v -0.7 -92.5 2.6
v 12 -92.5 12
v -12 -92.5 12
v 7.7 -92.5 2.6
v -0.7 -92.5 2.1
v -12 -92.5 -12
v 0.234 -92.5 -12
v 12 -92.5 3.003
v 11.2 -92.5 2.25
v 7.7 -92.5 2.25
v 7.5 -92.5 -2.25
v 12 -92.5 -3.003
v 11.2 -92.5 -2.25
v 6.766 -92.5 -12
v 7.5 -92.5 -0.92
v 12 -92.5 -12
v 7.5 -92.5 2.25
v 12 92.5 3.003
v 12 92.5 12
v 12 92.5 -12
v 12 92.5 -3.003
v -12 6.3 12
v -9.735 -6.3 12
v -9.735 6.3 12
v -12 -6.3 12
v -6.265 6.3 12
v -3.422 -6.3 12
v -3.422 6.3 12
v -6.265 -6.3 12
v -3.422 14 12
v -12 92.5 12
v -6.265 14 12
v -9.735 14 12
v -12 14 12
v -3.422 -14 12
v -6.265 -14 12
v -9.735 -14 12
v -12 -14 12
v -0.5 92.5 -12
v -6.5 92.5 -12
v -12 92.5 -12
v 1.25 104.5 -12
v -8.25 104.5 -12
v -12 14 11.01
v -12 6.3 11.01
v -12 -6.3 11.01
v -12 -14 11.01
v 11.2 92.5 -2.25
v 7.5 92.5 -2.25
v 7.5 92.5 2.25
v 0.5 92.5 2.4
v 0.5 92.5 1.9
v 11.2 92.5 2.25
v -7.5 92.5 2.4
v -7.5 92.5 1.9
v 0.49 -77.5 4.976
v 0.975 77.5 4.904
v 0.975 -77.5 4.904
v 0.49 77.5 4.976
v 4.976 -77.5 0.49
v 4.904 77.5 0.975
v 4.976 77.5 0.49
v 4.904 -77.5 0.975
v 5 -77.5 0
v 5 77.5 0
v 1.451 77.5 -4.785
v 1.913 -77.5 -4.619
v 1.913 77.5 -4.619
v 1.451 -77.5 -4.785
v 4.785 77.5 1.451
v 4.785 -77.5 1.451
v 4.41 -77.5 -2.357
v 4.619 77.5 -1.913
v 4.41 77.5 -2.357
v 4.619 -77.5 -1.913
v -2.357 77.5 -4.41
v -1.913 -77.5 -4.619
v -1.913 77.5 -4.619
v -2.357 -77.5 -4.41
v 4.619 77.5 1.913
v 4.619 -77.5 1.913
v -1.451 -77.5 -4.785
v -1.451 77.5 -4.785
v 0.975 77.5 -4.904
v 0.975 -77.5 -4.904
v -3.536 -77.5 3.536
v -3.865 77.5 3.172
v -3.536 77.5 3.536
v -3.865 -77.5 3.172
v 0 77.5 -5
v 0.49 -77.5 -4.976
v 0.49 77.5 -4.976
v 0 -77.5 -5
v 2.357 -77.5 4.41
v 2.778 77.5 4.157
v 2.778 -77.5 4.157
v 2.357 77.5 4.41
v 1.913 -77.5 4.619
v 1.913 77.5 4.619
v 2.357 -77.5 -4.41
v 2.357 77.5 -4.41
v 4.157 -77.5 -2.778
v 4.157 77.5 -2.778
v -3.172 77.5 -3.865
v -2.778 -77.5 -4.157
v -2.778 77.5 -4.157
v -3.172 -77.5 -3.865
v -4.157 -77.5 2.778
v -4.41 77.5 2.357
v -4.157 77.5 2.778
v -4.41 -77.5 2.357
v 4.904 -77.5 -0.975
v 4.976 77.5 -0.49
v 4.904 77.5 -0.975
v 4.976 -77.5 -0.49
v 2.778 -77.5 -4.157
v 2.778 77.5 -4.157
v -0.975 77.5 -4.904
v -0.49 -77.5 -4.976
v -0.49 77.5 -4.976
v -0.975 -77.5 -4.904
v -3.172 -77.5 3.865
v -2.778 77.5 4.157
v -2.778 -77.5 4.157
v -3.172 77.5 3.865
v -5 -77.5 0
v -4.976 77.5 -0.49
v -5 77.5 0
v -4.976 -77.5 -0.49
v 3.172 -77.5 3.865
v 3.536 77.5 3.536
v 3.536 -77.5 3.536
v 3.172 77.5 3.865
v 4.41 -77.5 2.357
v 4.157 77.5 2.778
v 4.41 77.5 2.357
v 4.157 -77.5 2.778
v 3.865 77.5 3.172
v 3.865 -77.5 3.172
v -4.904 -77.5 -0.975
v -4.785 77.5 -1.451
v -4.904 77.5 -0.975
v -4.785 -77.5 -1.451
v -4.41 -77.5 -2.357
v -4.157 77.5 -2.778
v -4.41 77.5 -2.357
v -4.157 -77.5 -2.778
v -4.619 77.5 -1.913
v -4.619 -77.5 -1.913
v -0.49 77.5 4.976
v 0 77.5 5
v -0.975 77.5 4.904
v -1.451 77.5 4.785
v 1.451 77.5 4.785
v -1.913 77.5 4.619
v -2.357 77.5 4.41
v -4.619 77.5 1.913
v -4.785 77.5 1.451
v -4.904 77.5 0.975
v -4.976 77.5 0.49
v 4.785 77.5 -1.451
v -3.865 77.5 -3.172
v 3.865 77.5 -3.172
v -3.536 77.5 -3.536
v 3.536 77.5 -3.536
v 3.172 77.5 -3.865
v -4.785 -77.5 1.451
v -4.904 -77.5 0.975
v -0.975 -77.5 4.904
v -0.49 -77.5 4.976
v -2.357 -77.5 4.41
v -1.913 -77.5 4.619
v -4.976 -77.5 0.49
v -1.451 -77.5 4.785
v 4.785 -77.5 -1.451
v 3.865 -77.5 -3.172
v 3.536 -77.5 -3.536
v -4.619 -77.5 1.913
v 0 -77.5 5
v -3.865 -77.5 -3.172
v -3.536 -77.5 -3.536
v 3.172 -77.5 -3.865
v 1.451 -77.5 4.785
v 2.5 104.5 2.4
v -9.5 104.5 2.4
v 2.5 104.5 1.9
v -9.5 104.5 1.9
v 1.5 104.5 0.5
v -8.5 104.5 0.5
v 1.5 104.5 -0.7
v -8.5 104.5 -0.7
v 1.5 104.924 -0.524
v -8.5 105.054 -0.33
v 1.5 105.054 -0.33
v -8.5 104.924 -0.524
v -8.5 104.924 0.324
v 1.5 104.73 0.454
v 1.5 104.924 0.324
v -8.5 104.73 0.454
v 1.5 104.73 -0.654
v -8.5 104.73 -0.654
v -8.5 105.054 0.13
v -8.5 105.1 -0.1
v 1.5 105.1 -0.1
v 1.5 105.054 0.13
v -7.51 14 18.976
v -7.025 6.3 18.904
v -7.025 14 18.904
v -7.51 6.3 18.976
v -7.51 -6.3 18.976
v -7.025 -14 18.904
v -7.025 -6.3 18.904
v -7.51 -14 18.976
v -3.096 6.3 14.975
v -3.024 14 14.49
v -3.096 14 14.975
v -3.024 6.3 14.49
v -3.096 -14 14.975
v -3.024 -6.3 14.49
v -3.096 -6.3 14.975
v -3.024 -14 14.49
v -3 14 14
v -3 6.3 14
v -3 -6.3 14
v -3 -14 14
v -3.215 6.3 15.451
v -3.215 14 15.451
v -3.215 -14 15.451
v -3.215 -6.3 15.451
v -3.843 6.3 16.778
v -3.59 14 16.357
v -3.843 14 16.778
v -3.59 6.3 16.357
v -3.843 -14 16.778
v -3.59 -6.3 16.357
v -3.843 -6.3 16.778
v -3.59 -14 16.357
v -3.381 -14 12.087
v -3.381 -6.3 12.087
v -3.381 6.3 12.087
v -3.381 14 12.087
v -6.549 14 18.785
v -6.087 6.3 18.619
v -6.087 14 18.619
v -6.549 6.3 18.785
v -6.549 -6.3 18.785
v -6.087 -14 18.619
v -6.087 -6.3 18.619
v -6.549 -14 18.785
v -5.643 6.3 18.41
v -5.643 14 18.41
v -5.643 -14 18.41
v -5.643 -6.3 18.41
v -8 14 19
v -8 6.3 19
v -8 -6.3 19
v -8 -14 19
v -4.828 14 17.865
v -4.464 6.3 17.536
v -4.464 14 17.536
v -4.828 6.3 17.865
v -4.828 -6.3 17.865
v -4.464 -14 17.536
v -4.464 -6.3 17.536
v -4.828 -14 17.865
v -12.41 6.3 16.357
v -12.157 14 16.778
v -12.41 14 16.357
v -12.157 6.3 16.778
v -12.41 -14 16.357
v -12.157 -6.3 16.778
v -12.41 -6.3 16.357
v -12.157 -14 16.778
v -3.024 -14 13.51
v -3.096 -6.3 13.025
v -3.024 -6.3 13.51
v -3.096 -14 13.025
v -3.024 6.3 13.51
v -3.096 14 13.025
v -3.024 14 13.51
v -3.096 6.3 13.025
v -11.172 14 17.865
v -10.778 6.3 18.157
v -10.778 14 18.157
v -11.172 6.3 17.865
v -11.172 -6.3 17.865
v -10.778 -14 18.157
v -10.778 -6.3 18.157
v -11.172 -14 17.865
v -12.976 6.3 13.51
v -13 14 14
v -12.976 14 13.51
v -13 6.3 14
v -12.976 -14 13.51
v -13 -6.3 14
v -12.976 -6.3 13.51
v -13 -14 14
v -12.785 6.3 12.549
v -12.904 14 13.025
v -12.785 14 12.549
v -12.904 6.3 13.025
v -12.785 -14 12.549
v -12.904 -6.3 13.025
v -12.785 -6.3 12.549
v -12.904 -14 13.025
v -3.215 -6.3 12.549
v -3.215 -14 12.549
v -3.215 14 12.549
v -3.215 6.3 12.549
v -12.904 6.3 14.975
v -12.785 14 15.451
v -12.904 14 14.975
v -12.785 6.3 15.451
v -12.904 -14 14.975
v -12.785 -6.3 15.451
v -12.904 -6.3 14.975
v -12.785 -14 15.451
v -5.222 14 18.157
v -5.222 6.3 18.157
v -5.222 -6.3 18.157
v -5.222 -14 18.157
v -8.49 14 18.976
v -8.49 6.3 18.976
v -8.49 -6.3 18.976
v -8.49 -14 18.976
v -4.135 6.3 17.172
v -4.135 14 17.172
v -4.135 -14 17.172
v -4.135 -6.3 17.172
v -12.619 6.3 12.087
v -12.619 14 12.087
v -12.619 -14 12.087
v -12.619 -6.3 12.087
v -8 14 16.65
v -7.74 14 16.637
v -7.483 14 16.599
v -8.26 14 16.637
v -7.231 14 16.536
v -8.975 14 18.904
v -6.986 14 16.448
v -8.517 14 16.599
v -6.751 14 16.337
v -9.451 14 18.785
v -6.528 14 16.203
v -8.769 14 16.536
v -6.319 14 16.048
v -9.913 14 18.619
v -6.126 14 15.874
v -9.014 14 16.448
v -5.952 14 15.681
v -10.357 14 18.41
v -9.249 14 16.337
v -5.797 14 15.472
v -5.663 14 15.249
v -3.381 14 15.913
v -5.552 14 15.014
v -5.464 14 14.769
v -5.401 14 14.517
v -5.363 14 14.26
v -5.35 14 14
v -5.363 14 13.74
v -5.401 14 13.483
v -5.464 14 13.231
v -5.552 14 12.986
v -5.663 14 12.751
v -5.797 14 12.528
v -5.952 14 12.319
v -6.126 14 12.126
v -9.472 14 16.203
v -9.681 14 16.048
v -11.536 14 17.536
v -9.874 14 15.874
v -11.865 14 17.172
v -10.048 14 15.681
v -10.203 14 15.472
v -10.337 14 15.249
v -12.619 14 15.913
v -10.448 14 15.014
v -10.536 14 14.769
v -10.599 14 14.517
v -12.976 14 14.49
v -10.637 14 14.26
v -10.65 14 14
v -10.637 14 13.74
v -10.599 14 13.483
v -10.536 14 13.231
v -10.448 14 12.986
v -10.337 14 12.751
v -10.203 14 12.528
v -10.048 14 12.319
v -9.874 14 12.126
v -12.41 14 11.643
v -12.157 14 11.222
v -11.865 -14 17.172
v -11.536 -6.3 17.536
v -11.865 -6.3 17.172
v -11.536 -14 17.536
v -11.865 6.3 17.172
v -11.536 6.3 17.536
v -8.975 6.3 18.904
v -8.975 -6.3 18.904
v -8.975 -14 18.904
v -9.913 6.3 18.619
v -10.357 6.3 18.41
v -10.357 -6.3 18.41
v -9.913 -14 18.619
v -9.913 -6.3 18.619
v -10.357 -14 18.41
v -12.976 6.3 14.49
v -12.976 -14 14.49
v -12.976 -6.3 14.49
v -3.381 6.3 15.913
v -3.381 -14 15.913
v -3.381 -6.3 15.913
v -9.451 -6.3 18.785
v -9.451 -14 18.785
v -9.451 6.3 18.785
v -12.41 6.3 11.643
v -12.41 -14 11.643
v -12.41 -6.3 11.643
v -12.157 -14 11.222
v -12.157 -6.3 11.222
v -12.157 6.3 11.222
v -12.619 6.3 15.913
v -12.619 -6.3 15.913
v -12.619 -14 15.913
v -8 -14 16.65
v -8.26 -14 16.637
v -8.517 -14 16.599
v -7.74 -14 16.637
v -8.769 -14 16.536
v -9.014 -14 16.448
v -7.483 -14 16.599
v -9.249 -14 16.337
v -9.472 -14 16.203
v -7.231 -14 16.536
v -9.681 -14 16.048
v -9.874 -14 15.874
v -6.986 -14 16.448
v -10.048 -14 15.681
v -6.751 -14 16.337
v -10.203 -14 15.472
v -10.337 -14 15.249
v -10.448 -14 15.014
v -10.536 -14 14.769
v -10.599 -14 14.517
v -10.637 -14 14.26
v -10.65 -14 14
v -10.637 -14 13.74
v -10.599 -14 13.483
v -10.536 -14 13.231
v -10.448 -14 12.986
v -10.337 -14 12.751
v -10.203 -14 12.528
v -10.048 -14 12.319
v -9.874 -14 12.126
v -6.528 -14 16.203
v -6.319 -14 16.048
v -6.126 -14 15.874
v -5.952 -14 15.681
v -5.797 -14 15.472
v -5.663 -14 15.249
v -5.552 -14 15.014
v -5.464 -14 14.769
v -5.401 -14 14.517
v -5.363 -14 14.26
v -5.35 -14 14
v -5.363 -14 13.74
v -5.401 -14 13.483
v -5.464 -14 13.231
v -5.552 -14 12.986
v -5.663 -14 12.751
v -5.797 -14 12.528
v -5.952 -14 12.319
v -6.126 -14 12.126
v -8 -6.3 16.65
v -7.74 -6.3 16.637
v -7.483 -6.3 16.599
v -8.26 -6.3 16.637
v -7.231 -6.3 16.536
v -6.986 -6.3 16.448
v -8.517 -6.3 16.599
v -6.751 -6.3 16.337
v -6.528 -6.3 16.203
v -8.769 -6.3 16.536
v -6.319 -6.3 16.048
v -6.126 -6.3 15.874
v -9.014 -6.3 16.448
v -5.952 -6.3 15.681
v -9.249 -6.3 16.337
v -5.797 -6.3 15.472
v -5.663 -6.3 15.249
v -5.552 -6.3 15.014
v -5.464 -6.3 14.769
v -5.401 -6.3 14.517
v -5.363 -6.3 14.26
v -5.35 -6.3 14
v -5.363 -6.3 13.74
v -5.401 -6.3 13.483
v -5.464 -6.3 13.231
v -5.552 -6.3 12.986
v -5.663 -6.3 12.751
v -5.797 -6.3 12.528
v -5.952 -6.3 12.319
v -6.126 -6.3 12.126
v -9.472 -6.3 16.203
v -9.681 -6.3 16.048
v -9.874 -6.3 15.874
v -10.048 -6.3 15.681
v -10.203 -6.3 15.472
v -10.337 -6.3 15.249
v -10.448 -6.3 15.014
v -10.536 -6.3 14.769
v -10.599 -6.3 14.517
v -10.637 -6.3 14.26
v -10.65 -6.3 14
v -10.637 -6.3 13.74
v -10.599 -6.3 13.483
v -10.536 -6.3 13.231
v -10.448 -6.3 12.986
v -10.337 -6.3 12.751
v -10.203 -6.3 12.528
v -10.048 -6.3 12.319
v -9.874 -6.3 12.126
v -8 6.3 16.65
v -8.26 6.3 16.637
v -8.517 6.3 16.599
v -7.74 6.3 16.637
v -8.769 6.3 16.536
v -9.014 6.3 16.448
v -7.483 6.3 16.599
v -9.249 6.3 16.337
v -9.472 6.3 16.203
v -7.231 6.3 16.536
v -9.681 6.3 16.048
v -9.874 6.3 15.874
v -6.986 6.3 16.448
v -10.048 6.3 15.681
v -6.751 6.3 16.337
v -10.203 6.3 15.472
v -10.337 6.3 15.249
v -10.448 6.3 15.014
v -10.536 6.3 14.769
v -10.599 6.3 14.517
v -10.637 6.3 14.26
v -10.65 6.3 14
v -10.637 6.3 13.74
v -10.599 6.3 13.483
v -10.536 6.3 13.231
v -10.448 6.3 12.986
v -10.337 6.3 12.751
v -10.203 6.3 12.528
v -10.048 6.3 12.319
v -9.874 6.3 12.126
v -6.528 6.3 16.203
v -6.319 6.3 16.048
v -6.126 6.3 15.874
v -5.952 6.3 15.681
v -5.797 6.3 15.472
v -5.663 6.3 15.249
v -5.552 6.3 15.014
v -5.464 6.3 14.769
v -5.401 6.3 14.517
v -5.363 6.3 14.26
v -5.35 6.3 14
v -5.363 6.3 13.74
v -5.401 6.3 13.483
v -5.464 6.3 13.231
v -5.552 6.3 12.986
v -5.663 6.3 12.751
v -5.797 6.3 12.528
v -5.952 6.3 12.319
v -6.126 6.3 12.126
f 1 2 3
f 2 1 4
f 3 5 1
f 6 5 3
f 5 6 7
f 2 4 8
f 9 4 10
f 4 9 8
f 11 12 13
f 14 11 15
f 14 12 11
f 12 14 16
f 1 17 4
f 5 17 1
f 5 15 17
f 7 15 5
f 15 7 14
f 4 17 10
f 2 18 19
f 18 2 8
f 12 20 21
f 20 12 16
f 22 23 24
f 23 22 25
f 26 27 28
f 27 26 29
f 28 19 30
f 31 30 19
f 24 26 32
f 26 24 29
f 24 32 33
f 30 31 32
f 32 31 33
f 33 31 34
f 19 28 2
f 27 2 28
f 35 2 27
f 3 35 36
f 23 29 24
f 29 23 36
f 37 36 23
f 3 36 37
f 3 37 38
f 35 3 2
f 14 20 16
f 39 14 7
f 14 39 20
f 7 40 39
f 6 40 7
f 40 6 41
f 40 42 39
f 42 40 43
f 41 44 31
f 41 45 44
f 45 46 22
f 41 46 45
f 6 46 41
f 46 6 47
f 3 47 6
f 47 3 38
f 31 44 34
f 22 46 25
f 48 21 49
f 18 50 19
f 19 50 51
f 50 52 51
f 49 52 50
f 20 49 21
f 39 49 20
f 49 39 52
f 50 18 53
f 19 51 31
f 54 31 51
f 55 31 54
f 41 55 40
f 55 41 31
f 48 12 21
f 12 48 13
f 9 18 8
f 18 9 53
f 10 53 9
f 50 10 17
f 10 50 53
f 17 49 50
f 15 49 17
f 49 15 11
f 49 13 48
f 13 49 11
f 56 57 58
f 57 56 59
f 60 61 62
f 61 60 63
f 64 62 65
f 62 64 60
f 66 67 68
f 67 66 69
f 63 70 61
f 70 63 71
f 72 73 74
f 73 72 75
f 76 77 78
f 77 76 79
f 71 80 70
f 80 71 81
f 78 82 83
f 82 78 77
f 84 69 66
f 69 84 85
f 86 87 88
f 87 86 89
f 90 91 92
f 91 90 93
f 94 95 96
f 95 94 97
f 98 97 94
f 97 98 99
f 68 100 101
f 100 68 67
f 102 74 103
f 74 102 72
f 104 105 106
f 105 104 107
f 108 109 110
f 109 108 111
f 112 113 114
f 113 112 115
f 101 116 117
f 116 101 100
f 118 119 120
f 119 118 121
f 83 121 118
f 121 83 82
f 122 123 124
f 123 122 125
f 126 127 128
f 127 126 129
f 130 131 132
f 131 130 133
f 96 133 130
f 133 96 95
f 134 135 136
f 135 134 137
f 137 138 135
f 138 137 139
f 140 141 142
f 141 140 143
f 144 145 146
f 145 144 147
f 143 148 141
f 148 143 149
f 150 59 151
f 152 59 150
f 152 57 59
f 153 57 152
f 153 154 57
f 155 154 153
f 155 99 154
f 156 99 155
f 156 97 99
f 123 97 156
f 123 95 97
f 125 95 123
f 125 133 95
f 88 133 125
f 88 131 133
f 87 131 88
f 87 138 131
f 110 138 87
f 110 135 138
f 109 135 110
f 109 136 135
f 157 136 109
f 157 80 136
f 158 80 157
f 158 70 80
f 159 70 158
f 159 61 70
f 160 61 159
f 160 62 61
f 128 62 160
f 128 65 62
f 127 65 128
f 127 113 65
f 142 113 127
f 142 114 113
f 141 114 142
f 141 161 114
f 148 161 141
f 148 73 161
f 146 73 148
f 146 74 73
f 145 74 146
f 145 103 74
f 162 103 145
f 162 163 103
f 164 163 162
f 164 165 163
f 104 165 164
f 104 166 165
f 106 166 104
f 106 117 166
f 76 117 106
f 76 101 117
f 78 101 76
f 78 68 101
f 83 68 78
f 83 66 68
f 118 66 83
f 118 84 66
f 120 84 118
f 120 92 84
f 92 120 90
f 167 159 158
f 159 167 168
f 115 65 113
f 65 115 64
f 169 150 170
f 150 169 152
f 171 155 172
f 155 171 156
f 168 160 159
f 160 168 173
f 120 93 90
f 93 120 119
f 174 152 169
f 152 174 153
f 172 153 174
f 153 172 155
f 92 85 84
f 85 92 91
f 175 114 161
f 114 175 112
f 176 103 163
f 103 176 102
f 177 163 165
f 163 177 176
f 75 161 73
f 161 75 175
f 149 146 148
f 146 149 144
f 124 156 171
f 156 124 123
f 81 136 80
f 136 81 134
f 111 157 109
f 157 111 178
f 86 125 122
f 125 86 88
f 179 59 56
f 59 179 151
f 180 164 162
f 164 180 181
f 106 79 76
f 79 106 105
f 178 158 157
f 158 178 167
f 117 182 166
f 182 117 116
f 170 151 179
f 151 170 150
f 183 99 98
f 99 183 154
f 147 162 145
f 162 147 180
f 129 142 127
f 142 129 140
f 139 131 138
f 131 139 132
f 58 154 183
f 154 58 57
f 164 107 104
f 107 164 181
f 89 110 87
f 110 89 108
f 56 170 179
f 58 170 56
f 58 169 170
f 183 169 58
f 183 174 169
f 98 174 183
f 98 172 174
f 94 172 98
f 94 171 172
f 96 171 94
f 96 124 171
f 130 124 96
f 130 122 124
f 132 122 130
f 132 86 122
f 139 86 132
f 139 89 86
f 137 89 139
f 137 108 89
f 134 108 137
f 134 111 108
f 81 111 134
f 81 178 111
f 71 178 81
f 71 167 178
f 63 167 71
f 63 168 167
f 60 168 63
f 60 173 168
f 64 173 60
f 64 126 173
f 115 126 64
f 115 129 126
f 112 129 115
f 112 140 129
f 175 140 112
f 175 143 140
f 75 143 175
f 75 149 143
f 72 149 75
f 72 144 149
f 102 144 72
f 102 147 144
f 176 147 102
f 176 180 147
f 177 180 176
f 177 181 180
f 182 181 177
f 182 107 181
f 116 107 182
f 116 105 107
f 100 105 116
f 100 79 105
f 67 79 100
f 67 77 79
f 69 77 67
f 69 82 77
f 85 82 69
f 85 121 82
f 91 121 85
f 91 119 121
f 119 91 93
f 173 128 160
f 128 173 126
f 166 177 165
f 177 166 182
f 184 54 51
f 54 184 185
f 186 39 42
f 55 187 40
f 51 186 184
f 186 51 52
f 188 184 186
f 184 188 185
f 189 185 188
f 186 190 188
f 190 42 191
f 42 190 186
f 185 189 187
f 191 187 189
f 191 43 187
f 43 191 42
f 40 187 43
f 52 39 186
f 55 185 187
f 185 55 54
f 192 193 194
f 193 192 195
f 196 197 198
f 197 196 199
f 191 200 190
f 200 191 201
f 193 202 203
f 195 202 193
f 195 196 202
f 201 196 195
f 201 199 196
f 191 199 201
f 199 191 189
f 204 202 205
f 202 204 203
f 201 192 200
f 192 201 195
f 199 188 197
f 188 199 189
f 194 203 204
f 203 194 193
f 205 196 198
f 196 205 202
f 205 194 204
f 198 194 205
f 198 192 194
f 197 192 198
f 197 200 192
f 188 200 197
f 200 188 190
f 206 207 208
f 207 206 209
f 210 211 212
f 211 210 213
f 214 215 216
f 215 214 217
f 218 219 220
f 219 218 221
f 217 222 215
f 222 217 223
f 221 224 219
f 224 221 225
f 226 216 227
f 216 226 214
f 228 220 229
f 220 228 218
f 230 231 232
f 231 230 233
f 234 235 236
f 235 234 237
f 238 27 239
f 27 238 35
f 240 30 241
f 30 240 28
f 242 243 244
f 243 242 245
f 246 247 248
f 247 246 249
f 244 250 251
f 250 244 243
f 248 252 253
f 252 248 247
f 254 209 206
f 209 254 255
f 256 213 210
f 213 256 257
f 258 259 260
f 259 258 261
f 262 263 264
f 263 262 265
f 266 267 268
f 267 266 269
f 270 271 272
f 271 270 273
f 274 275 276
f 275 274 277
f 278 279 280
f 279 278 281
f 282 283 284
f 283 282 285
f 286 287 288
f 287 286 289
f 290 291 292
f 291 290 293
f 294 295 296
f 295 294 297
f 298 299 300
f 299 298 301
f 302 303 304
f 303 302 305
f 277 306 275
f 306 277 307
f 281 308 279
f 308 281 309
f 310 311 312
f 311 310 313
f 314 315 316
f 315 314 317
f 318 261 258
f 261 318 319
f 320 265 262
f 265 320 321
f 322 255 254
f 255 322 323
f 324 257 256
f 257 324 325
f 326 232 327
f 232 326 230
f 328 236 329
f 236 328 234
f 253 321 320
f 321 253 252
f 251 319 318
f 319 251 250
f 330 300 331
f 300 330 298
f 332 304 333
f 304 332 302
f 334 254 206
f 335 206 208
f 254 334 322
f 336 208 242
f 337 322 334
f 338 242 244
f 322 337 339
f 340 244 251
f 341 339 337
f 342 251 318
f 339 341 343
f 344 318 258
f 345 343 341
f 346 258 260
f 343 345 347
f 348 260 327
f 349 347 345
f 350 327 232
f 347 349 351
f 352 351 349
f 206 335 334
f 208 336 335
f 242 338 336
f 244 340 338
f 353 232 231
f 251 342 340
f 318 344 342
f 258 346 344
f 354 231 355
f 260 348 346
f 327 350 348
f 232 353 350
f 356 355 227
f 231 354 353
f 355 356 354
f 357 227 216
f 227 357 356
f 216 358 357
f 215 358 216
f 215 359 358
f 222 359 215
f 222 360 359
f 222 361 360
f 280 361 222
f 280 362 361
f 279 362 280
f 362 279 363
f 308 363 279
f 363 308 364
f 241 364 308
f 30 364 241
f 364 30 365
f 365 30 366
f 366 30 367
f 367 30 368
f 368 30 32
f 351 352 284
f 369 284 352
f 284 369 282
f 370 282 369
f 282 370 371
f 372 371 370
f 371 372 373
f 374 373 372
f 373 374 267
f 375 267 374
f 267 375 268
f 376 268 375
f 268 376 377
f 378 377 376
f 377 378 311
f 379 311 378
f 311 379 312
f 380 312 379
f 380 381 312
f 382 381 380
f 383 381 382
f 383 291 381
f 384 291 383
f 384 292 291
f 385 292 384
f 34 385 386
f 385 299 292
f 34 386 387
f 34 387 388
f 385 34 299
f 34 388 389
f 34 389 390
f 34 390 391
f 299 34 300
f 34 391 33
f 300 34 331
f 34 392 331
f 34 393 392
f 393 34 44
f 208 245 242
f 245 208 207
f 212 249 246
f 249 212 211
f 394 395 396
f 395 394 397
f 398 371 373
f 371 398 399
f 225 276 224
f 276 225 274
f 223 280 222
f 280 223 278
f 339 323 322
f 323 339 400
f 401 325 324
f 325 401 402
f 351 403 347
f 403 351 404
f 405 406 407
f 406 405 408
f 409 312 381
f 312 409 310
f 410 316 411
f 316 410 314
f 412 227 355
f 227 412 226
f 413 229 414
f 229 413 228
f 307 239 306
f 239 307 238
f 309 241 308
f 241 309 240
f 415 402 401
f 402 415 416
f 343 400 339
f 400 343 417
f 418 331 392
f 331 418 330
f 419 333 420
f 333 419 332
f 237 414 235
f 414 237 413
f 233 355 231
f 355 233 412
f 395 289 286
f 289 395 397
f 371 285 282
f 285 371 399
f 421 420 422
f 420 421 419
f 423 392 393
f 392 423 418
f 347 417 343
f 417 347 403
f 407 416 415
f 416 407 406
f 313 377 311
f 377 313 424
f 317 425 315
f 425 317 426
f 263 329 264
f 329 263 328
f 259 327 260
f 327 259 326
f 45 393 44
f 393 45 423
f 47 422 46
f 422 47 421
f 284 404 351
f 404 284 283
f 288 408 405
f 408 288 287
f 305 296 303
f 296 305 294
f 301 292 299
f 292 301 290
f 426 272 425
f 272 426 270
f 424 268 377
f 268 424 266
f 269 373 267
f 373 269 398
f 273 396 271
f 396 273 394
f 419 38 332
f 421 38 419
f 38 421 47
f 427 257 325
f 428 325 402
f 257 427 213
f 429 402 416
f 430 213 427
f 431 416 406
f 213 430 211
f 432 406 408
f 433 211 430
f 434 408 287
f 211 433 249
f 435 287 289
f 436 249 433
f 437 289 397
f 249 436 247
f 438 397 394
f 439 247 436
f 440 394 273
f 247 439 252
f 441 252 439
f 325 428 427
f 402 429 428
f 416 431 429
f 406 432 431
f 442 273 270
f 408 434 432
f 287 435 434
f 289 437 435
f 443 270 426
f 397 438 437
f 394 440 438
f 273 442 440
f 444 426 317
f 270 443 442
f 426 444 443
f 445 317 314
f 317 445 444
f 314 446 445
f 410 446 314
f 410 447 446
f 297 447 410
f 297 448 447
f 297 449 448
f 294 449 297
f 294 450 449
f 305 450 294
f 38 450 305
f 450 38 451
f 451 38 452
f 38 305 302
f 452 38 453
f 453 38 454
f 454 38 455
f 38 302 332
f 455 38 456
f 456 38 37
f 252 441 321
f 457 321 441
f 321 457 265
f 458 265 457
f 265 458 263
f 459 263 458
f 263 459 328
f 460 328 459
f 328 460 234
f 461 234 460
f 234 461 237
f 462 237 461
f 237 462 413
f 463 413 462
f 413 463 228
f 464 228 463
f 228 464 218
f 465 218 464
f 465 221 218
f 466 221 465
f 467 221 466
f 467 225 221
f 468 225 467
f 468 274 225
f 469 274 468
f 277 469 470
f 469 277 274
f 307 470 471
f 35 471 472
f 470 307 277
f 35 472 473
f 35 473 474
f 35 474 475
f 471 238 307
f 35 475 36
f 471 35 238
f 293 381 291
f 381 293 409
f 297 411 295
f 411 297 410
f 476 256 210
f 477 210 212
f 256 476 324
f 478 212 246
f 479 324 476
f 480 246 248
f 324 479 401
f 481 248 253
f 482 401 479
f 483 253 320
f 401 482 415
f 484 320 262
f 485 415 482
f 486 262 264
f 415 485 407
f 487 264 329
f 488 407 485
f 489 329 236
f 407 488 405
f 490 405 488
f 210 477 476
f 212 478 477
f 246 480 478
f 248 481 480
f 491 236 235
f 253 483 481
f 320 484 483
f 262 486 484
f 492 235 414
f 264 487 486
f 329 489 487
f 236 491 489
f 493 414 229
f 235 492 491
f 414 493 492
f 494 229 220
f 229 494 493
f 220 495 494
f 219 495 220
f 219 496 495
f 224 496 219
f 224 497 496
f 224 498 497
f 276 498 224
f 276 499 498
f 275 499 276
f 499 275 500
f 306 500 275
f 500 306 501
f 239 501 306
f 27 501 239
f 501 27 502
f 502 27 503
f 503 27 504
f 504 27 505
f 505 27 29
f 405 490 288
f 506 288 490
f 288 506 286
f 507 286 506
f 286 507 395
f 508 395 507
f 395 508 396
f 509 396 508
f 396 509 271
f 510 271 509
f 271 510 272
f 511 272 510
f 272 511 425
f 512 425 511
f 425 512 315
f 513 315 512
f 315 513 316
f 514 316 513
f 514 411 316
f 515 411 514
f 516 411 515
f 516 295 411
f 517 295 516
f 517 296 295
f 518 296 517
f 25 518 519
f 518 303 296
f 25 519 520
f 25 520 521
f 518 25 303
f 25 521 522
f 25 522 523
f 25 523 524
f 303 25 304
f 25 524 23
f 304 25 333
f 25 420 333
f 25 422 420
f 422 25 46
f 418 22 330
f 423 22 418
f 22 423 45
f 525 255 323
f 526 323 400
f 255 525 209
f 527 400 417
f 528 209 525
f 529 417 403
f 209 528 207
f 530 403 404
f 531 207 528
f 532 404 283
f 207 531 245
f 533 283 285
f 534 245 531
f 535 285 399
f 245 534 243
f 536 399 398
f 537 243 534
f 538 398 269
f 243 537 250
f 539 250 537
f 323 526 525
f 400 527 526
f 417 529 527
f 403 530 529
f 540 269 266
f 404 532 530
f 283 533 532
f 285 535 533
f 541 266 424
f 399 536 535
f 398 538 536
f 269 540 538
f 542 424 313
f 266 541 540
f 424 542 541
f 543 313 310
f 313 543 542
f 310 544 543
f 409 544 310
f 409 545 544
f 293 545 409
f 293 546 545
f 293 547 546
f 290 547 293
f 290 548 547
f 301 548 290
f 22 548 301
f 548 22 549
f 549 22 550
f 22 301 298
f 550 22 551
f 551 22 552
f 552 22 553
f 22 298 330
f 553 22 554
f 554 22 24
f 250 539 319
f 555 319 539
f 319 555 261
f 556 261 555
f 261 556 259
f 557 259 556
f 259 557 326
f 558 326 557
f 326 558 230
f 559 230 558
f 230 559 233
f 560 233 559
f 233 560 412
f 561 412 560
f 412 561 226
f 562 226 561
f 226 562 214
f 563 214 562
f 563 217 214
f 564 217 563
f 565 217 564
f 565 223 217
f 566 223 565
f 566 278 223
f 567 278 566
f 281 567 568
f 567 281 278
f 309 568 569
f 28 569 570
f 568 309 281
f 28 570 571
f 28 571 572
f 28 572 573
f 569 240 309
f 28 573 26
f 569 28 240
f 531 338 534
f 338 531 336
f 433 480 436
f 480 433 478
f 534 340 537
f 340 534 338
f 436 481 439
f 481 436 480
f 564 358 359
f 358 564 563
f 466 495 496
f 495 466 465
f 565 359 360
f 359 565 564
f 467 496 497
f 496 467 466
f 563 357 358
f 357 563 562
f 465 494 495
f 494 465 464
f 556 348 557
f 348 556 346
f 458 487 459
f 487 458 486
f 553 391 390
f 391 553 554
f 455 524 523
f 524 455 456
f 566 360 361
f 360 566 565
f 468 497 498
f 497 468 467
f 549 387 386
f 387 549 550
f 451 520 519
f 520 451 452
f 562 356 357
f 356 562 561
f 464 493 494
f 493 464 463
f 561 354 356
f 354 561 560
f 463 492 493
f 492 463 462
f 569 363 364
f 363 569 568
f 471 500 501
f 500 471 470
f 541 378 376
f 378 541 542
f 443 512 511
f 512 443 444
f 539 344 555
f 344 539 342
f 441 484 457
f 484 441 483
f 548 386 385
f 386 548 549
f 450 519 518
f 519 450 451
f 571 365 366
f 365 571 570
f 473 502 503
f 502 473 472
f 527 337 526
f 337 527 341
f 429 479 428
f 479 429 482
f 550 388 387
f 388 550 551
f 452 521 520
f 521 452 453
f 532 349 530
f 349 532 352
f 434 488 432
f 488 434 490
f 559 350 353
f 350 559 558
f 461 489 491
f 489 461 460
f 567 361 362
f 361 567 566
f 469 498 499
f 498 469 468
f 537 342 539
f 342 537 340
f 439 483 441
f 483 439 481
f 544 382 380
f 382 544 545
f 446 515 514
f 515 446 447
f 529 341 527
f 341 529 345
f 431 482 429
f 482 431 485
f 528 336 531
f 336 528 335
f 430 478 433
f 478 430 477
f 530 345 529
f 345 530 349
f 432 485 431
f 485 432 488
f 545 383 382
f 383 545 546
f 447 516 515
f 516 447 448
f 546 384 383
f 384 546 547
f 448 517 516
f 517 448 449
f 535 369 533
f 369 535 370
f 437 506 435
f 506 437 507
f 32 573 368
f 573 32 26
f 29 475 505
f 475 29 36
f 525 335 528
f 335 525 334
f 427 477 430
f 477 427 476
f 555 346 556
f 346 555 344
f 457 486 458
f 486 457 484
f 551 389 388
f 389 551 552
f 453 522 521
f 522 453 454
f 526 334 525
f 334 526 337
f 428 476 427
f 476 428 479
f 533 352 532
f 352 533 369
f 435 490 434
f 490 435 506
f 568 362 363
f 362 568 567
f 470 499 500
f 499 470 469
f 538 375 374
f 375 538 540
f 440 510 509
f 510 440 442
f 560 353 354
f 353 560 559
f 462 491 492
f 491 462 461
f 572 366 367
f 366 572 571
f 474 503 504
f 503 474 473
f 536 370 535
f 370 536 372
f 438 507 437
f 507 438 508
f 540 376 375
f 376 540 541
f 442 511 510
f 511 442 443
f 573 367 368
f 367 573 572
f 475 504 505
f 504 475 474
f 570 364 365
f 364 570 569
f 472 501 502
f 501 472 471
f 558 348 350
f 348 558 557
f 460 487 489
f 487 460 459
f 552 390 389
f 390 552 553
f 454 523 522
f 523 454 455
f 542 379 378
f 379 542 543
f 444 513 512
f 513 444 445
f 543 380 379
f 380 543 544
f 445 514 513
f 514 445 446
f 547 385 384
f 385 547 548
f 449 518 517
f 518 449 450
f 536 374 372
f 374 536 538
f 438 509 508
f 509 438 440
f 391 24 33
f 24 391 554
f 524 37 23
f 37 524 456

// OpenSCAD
// file: edge_standard.scad
// ====================================================================
// 2. Standard Frame Edge Strut (Part 2 of 8)
// Standardized 185 mm structural beam
// Features 2 spline slots on outside edges (+X and +Z faces)
// Features Male wedge on +Y end, Female open-top pocket on -Y end
// ====================================================================
include <../config.scad>
use <../modules/dovetail.scad>
use <../modules/spline_profile.scad>

module edge_standard(
    length = FRAME_EDGE_LEN,
    width  = BEAM_WIDTH,
    height = BEAM_HEIGHT,
    has_spline = true,
    has_spline_x = undef,
    has_spline_z = undef
) {
    spline_x = is_undef(has_spline_x) ? has_spline : has_spline_x;
    spline_z = is_undef(has_spline_z) ? has_spline : has_spline_z;

    difference() {
        // Main solid beam body
        cube([width, length, height], center = true);
        
        // Spline slot 1 on outside edge (+X face)
        if (spline_x) {
            translate([width/2, 0, 0])
            rotate([0, 90, 0])
            spline_groove_negative(length = length + 2, axis = "Y");
        }
        
        // Spline slot 2 on outside edge (+Z face)
        if (spline_z) {
            translate([0, 0, height/2])
            spline_groove_negative(length = length + 2, axis = "Y");
        }
        
        // Female open-top wedge pocket at -Y end
        translate([0, -length/2, 0])
        rotate([0, 0, 180])
        female_dovetail_pocket(w = width, h = height);
        
        // Internal weight reduction channel
        rotate([90, 0, 0])
        cylinder(d = 10, h = length - (DOVETAIL_DEPTH * 2 + 6), center = true);
    }
    
    // Male wedge tenon at +Y end
    translate([0, length/2, 0])
    male_dovetail(w = width, h = height);
}

// Standalone preview
edge_standard();
// file: ../modules/hinge.scad
// ====================================================================
// Integrated 3D Printable Hinge Module
// Pin-and-barrel knuckle hinge for French doors and top roof doors
// ====================================================================
include <../config.scad>

// Female Hinge Knuckle (mounted to frame pillar)
module hinge_female_knuckle(
    barrel_od = 10.0,
    pin_id = 5.0,
    height = 28.0,
    center_gap = 12.0
) {
    difference() {
        cylinder(d = barrel_od, h = height, center = true);
        
        // Center cutout for male knuckle
        cube([barrel_od + 2, barrel_od + 2, center_gap + 2*TOL_HINGE], center = true);
        
        // Through-hole for hinge pin
        cylinder(d = pin_id + TOL_HINGE, h = height + 4, center = true);
    }
}

// Male Hinge Knuckle (mounted to door frame)
module hinge_male_knuckle(
    barrel_od = 10.0,
    pin_id = 5.0,
    knuckle_h = 11.5
) {
    difference() {
        cylinder(d = barrel_od - 0.2, h = knuckle_h, center = true);
        
        // Through-hole for hinge pin
        cylinder(d = pin_id + TOL_HINGE, h = knuckle_h + 2, center = true);
    }
}

// Dedicated 3D Printable Hinge Pin with Retention Head
module hinge_pin(
    pin_id = 5.0,
    length = 32.0
) {
    union() {
        // Main pin shaft
        cylinder(d = pin_id - TOL_HINGE, h = length, center = true);
        
        // Chamfered tip for easy alignment insertion
        translate([0, 0, length/2])
        cylinder(r1 = (pin_id - TOL_HINGE)/2, r2 = (pin_id - TOL_HINGE)/2 - 0.8, h = 2, center = false);
        
        // Retention cap
        translate([0, 0, -length/2 - 2])
        cylinder(d = pin_id + 4, h = 2.5, center = false);
    }
}
// file: ../modules/spline_profile.scad
// ====================================================================
// Cellophane Spline Groove & Snap-in Locking Strip Module
// Retention mechanism to hold packaging plastic taut without screws
// ====================================================================
include <../config.scad>

// Negative volume for cutting the spline groove into any beam surface
// Cuts into the -Z direction from Z=0.
// Axis parameter: "Y" (default, aligned with beam length) or "X"
module spline_groove_negative(length = 100, axis = "Y") {
    gw = GROOVE_WIDTH;   // 4.5 mm
    gd = GROOVE_DEPTH;   // 5.0 mm
    
    // Cross-section profile of the groove (in X-Z plane, cuts down into -Z)
    // with 45-degree lead-in chamfer at the mouth to prevent tearing cellophane
    module groove_cross_section_2d() {
        polygon(points = [
            [-(gw/2 + 0.8),  0.05],  // Mouth chamfer outer left
            [-gw/2,         -0.80],  // Mouth chamfer inner left
            [-gw/2,         -gd],    // Bottom left
            [ gw/2,         -gd],    // Bottom right
            [ gw/2,         -0.80],  // Mouth chamfer inner right
            [ (gw/2 + 0.8),  0.05]   // Mouth chamfer outer right
        ]);
    }
    
    if (axis == "Y") {
        rotate([90, 0, 0])
        linear_extrude(height = length, center = true) {
            groove_cross_section_2d();
        }
    } else {
        rotate([0, 90, 0])
        rotate([0, 0, 90])
        linear_extrude(height = length, center = true) {
            groove_cross_section_2d();
        }
    }
}

// 2D Profile of the snap-in locking spline clip (X-Z plane)
// Designed for FDM printing with smooth entry, retention ridge, and thumb cap
module spline_clip_profile_2d() {
    w_cap   = 6.8; // Top thumb-press cap width (depth stop & grip)
    h_cap   = 1.8; // Cap thickness
    w_shaft = 3.9; // Shaft body width (sized for 4.5mm groove + cellophane)
    h_depth = 4.6; // Insertion depth into groove
    w_nose  = 2.8; // Tapered lead-in nose width
    w_ridge = 4.3; // Retention snap ridge width
    
    union() {
        // 1. Top Thumb-Press Cap / Flange (sits above groove as depth stop)
        translate([0, h_cap / 2])
        hull() {
            translate([-w_cap/2 + 0.8, -h_cap/2 + 0.4]) circle(r = 0.4, $fn=16);
            translate([ w_cap/2 - 0.8, -h_cap/2 + 0.4]) circle(r = 0.4, $fn=16);
            translate([-w_cap/2 + 1.2,  h_cap/2 - 0.4]) circle(r = 0.4, $fn=16);
            translate([ w_cap/2 - 1.2,  h_cap/2 - 0.4]) circle(r = 0.4, $fn=16);
        }
        
        // 2. Insertion Shaft with Retention Ridge & Chamfered Nose
        translate([0, 0])
        polygon(points = [
            [-w_shaft/2,        0.0],
            [-w_shaft/2,       -2.2],
            [-w_ridge/2,       -3.0], // Snap retention bead
            [-w_shaft/2,       -3.6],
            [-w_nose/2,        -h_depth], // Nose chamfer
            [ w_nose/2,        -h_depth],
            [ w_shaft/2,       -3.6],
            [ w_ridge/2,       -3.0], // Snap retention bead
            [ w_shaft/2,       -2.2],
            [ w_shaft/2,        0.0]
        ]);
    }
}

// 3D Snap-in Locking Spline Clip (oriented along Y axis by default)
// When placed at Z = 0 with oriented_for_print = true, lays flat on the bed
module spline_clip(length = 150, axis = "Y", oriented_for_print = false) {
    if (oriented_for_print) {
        // Lay flat on side for maximum layer strength and zero supports
        // Cap width (6.8mm) or shaft lays on build plate
        rotate([0, 90, 0])
        rotate([0, 0, 90])
        linear_extrude(height = length, center = true) {
            spline_clip_profile_2d();
        }
    } else {
        if (axis == "Y") {
            rotate([90, 0, 0])
            linear_extrude(height = length, center = true) {
                spline_clip_profile_2d();
            }
        } else {
            rotate([0, 90, 0])
            rotate([0, 0, 90])
            linear_extrude(height = length, center = true) {
                spline_clip_profile_2d();
            }
        }
    }
}
// file: ../modules/dovetail.scad
// ====================================================================
// Dual-Taper Wedge Dovetail Module (Peg-Free, Self-Locking)
// Main Frame Wedge & Mini Door Wedge Systems
// ====================================================================
include <../config.scad>

// 2D Profile of Dovetail Slice in X-Y plane
module dovetail_slice_2d(root_w, tip_w, depth) {
    w_r = root_w / 2;
    w_t = tip_w / 2;
    polygon(points = [
        [-w_r, 0],
        [-w_t, depth],
        [ w_t, depth],
        [ w_r, 0]
    ]);
}

// ----------------------------------------------------
// ----------------------------------------------------
// 1. Main Frame Dual-Taper Wedge Dovetail (24 x 24 mm Profile)
// Starts at flat side (0%) and spans 60% through the frame square
// Leaves the outer 40% (which carries the 30% slot & spline) completely solid
// ----------------------------------------------------
module male_dovetail(
    w = BEAM_WIDTH,
    h = BEAM_HEIGHT,
    depth = DOVETAIL_DEPTH,
    tol = 0
) {
    // Starts at flat inside face (-h/2) and goes 60% through
    z_start = -h/2 + tol;
    z_end   = -h/2 + 0.60 * h - tol;
    
    // Shift toward inside face in X (-w/2) away from +X spline slot
    x_off = -3.5;
    
    b_root = 6.0 - 2*tol;
    b_tip  = 9.5 - 2*tol;
    t_root = 8.0 - 2*tol;
    t_tip  = 12.0 - 2*tol;
    
    translate([x_off, 0, 0])
    union() {
        hull() {
            translate([0, 0, z_start])
            linear_extrude(height = 0.5)
            dovetail_slice_2d(b_root, b_tip, depth);
            
            translate([0, 0, z_end - 0.5])
            linear_extrude(height = 0.5)
            dovetail_slice_2d(t_root, t_tip, depth);
        }
        
        // Tactile snap detent bead near the 60% internal shoulder
        translate([0, depth, z_end - 2.5])
        rotate([0, 90, 0])
        cylinder(r = 0.6, h = t_tip - 2, center = true, $fn=16);
    }
}

module female_dovetail_pocket(
    w = BEAM_WIDTH,
    h = BEAM_HEIGHT,
    depth = DOVETAIL_DEPTH,
    tol = TOL_DOVETAIL
) {
    // Starts at flat inside face (-h/2, open) and goes 60% through
    z_start = -h/2 - 1.0;
    z_end   = -h/2 + 0.60 * h + tol;
    
    // Shift toward inside face in X (-w/2) away from +X spline slot, matching male_dovetail
    x_off = -3.5;
    
    b_root = 6.0 + 2*tol;
    b_tip  = 9.5 + 2*tol;
    t_root = 8.0 + 2*tol;
    t_tip  = 12.0 + 2*tol;
    
    translate([x_off, 0, 0])
    union() {
        hull() {
            translate([0, 0, z_start])
            linear_extrude(height = 0.5)
            dovetail_slice_2d(b_root, b_tip, depth + 0.6);
            
            translate([0, 0, z_end - 0.5])
            linear_extrude(height = 0.5)
            dovetail_slice_2d(t_root, t_tip, depth + 0.6);
        }
        
        // Matching snap detent groove in pocket floor near 60% ceiling
        translate([0, depth, z_end - 2.5])
        rotate([0, 90, 0])
        cylinder(r = 0.8, h = t_tip + 2, center = true, $fn=16);
    }
}

// ----------------------------------------------------
// 2. Mini Door Dual-Taper Wedge Dovetail (18 x 16 mm Profile)
// Starts at flat side (0%) and spans 60% through
// ----------------------------------------------------
module mini_male_dovetail(
    w = DOOR_PROFILE_W,
    h = DOOR_PROFILE_T,
    depth = DOOR_DEPTH,
    tol = 0
) {
    z_start = -h/2 + tol;
    z_end   = -h/2 + 0.60 * h - tol;
    
    b_root = 5.0 - 2*tol;
    b_tip  = 8.0 - 2*tol;
    t_root = 6.5 - 2*tol;
    t_tip  = 10.0 - 2*tol;
    
    union() {
        hull() {
            translate([0, 0, z_start])
            linear_extrude(height = 0.5)
            dovetail_slice_2d(b_root, b_tip, depth);
            
            translate([0, 0, z_end - 0.5])
            linear_extrude(height = 0.5)
            dovetail_slice_2d(t_root, t_tip, depth);
        }
        
        // Snap detent bead near 60% shoulder
        translate([0, depth, z_end - 2.0])
        rotate([0, 90, 0])
        cylinder(r = 0.5, h = t_tip - 1.5, center = true, $fn=16);
    }
}

module mini_female_dovetail_pocket(
    w = DOOR_PROFILE_W,
    h = DOOR_PROFILE_T,
    depth = DOOR_DEPTH,
    tol = TOL_DOVETAIL
) {
    z_start = -h/2 - 1.0;
    z_end   = -h/2 + 0.60 * h + tol;
    
    b_root = 5.0 + 2*tol;
    b_tip  = 8.0 + 2*tol;
    t_root = 6.5 + 2*tol;
    t_tip  = 10.0 + 2*tol;
    
    union() {
        mirror([0, 1, 0])
        hull() {
            translate([0, 0, z_start])
            linear_extrude(height = 0.5)
            dovetail_slice_2d(b_root, b_tip, depth + 0.5);
            
            translate([0, 0, z_end - 0.5])
            linear_extrude(height = 0.5)
            dovetail_slice_2d(t_root, t_tip, depth + 0.5);
        }
        
        // Matching detent groove
        translate([0, -depth, z_end - 2.0])
        rotate([0, 90, 0])
        cylinder(r = 0.7, h = t_tip + 2, center = true, $fn=16);
    }
}
// file: ../config.scad
// ====================================================================
// Bambu Lab A1 Enclosure - Global Configuration Parameters
// Ultra-Minimal 8-Part Modular Kit (Face-Overlay Architecture)
// ====================================================================

// --- Print Bed Limits ---
MAX_PRINT_X = 256;
MAX_PRINT_Y = 256;
MAX_PRINT_Z = 256;
SAFE_PART_MAX_LEN = 240; // Conservative safety margin for brims

// --- Internal Enclosure Dimensions (mm) ---
// Sized for Bambu Lab A1 bed-slinger travel, right poop bucket, and top BMCU 370c
INTERNAL_WIDTH  = 560; // X axis clearance (A1 + toolhead + right poop bucket)
INTERNAL_DEPTH  = 580; // Y axis clearance (Bed travel + rear cable loop buffer)
INTERNAL_HEIGHT = 710; // Z axis clearance (Gantry + BMCU 370c rotating mount + spool)

// --- Standardized Modular Grid Lengths ---
FRAME_EDGE_LEN  = 185.0; // Standardized length for ALL frame edge segments
DOOR_EDGE_LEN   = 138.0; // Standardized length for ALL door/roof edge segments

// --- Frame Profile Dimensions ---
BEAM_WIDTH   = 24.0;  // Frame beam width X/Y (mm)
BEAM_HEIGHT  = 24.0;  // Frame beam height Z (mm)
CORNER_SIZE  = 36.0;  // 3-way cubic corner junction dimension

// --- Door Profile Dimensions (Slim Face-Overlay) ---
DOOR_PROFILE_W = 18.0; // Width across door frame face (mm)
DOOR_PROFILE_T = 16.0; // Thickness of door frame (mm)
DOOR_CORNER_W  = 25.0; // L-shaped door corner block dimension (mm)

// --- Tolerances (FDM 3D Printing tuned for Bambu Lab A1 0.4mm nozzle) ---
TOL_TIGHT    = 0.15; // Tight press fit (spline clips)
TOL_DOVETAIL = 0.20; // Sliding interlock fit (wedge dovetails)
TOL_HINGE    = 0.30; // Free rotating hinge pins
TOL_LOOSE    = 0.40; // Clearance gaps

// --- Cellophane Spline Groove Specifications ---
GROOVE_WIDTH      = 4.5;   // Width of U-channel
GROOVE_DEPTH      = 4.5;   // Depth of U-channel (~20-30% of frame square)
FRAME_SPLINE_LEN  = 180.0; // Pre-sized continuous frame clip length
DOOR_SPLINE_LEN   = 133.0; // Pre-sized continuous door clip length

// --- Peg-Free 60% Flat-Side Wedge Dovetail Dimensions ---
// Dovetails start at flat side (0%) and span 60% through the frame square
// Leaves the outer 40% (which carries the 30% slot & spline) completely solid
DOVETAIL_DEPTH = 12.0; // Insertion length of wedge insert (mm)

// Main Frame Wedge Dovetail (spans 60% of 24mm square from flat side)
FRAME_BOT_ROOT = 6.0;  // Root width at flat entry
FRAME_BOT_TIP  = 9.5;  // Tip width at flat entry
FRAME_TOP_ROOT = 8.0;  // Root width at 60% shoulder
FRAME_TOP_TIP  = 12.0; // Tip width at 60% shoulder (isolated from outside splines)

// Mini Door Wedge Dovetail (scaled for 18x16 mm door profile)
DOOR_BOT_ROOT  = 5.0;
DOOR_BOT_TIP   = 8.5;
DOOR_TOP_ROOT  = 6.5;
DOOR_TOP_TIP   = 10.5;
DOOR_DEPTH     = 8.0;

// --- Filament PTFE Tube Routing (Bottom Side Beam) ---
PTFE_TUBE_OD  = 4.0; // Standard PTFE bowden tube outer diameter (mm)
PTFE_HOLE_DIA = 4.3; // Slip-fit through-hole diameter with retention grip
PTFE_TUBE_CNT = 4;   // 4 dedicated filament tubes for multi-material / drybox
PTFE_ANGLE    = 35;  // Upward angle toward toolhead/BMCU (degrees)

// --- Render Quality ($fn) ---
$fn = $preview ? 24 : 64;
// main file
// ====================================================================
// 3. Frame Edge with Door Hinge (Part 3 of 8)
// Standardized 185 mm structural beam with integrated female hinge knuckle
// Replaces 1 spline side (+Z) with the hinge knuckle.
// Side wall cellophane spline is on +X; door side is on opposite side (-X).
// ====================================================================
include <../config.scad>
use <../modules/dovetail.scad>
use <../modules/spline_profile.scad>
use <../modules/hinge.scad>
use <edge_standard.scad>

module edge_hinge(
    length = FRAME_EDGE_LEN,
    width  = BEAM_WIDTH,
    height = BEAM_HEIGHT,
    is_left_pillar = true
) {
    knuckle_x = is_left_pillar ? (-width/2 + 4.0) : (width/2 - 4.0);
    union() {
        // Base edge body:
        // has_spline_x = true (side wall cellophane)
        // has_spline_z = false (replaced by hinge)
        edge_standard(
            length = length,
            width  = width,
            height = height,
            has_spline_x = true,
            has_spline_z = false
        );
        
        // Female hinge knuckle on +Z face (replacing 1 spline side)
        // Positioned toward the door side (-X on left pillar, +X on right pillar)
        // Offset forward so the overlay door swings 180° flat against the side
        translate([knuckle_x, 0, height/2 + 2.0])
        rotate([90, 0, 0])
        hinge_female_knuckle();
    }
}

// Standalone preview
edge_hinge();
